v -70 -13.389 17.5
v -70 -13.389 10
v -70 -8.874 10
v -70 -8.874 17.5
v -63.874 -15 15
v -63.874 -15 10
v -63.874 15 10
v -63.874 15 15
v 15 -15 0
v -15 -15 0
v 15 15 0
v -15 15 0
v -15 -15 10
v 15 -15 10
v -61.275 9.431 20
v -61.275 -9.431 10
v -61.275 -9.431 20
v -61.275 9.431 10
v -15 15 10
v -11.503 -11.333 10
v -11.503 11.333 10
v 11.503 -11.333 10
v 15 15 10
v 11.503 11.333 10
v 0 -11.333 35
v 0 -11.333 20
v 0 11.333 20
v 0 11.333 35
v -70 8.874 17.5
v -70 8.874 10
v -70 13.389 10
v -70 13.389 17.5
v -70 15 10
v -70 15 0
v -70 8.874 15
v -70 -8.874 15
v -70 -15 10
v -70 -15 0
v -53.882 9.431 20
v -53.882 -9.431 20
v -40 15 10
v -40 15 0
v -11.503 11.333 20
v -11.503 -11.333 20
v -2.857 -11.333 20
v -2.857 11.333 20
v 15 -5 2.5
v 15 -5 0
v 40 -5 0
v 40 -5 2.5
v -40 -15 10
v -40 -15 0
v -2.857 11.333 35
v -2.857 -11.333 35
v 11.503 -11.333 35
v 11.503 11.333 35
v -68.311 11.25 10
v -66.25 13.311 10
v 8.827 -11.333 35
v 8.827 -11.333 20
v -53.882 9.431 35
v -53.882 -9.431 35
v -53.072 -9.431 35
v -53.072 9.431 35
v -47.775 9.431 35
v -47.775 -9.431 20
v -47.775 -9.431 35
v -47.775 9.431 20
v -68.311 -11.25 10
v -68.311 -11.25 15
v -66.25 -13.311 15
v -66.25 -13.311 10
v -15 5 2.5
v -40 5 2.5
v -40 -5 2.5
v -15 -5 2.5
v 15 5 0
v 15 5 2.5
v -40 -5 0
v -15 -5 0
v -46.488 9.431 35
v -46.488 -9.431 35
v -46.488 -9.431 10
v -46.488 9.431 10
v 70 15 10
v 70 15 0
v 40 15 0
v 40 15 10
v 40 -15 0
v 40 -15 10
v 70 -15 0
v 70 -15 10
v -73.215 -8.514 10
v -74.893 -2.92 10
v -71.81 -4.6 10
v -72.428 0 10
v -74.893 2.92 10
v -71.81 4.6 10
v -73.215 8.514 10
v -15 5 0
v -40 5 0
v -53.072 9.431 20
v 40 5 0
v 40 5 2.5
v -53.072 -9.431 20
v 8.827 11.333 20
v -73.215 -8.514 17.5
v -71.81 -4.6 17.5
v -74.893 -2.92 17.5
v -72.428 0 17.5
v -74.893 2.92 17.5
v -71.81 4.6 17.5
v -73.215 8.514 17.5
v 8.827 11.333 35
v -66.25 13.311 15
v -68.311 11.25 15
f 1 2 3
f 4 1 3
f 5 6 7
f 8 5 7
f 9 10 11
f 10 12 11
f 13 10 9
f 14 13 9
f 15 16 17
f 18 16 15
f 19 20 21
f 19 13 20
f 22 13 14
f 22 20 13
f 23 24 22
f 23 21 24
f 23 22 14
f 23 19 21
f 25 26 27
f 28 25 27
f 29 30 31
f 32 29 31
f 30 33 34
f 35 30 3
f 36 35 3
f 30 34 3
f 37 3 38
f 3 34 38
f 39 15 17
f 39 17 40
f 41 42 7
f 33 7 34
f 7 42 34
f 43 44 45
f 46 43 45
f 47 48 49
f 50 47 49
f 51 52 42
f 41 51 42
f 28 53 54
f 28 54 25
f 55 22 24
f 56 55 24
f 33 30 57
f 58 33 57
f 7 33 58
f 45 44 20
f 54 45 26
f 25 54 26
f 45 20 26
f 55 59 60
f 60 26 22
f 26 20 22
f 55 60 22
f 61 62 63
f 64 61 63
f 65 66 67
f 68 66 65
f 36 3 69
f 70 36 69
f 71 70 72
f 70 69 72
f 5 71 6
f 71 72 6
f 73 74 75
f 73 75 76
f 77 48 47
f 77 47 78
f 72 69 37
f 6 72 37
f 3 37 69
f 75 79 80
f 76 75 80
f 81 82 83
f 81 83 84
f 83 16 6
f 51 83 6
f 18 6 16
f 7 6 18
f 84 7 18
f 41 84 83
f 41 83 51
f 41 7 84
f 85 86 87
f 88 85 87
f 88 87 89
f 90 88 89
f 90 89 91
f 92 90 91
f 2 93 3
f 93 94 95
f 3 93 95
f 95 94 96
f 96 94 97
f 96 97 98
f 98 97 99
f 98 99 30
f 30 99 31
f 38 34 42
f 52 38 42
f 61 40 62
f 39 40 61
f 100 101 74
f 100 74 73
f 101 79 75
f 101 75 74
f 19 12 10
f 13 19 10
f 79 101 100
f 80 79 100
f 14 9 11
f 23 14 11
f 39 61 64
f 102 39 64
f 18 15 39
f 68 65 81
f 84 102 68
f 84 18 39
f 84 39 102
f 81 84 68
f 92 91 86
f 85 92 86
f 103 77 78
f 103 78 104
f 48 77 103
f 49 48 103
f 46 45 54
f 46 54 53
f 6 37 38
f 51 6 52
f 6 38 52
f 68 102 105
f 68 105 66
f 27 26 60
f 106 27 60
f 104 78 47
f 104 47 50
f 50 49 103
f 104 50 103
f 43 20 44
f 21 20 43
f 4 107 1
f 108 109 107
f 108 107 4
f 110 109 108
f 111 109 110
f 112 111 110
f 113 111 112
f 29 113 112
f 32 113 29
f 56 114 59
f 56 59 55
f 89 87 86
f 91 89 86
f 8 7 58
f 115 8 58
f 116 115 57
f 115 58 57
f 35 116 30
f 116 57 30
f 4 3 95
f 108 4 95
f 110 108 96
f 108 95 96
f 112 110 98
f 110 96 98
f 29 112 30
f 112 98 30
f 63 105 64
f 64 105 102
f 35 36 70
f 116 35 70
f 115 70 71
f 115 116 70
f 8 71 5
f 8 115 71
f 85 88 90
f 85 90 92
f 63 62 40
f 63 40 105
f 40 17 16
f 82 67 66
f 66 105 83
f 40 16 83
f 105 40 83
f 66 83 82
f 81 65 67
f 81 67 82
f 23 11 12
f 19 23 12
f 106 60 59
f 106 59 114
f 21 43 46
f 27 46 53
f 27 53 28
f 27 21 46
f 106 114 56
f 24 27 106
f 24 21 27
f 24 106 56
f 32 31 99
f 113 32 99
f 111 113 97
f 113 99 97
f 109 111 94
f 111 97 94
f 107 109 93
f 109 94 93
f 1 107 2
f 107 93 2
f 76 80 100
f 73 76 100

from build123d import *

# Parameters (mm, degrees)
F0_W      = 15
F0_H      = 10
F1_DEPTH  = 10
F0_W_2    = 25
F2_DEPTH  = 2.5
F4_DEPTH  = 5
F5_DEPTH  = 7.5
F6_W      = 0.8094720542
F6_H      = 18.8618451357
F6_W_2    = 1.2870579958
F7_DEPTH  = 25
F6_W_3    = 7.3937214911
F6_W_4    = 5.2971914411
F8_DEPTH  = 10
F9_W      = 2.8573467862
F9_H      = 22.6669162512
F9_W_2    = 2.6768604293
F10_DEPTH = 25
F9_W_3    = 8.6461429019
F9_W_4    = 8.8266292587
F11_DEPTH = 10


with BuildPart() as f1:
    # F0 (on Top) → F1 (new body)
    with BuildSketch(Plane.XY):
        Polygon((-55, 5), (-40, 5), (-40, 15), (-70, 15), (-70, -15), (-40, -15), (-40, -5), (-55, -5), align=None)
        with Locations((-47.5, 0)):
            Rectangle(F0_W, F0_H)
    extrude(amount=F1_DEPTH)

    # F3 (on face) → F4 (join)
    with BuildSketch(Plane.XY.offset(10)):
        with BuildLine():
            Line((-63.8738188665, -15), (-63.8738188665, 15))
            ThreePointArc((-63.8738188665, 15), (-67.3236492419, 12.3236492419), (-70, 8.8738188665))
            Line((-70, 8.8738188665), (-70, -8.8738188665))
            ThreePointArc((-70, -8.8738188665), (-67.3236492419, -12.3236492419), (-63.8738188665, -15))
        make_face()
    extrude(amount=F4_DEPTH)

    # F6 (on face) → F7 (join)
    with BuildSketch(Plane.XY.offset(10)):
        with Locations((-53.4769240767, 0)):
            Rectangle(F6_W, F6_H)
        with Locations((-47.1314676106, 0)):
            Rectangle(F6_W_2, F6_H)
    extrude(amount=F7_DEPTH)

    # F6 (on face) → F8 (join)
    with BuildSketch(Plane.XY.offset(10)):
        with Locations((-57.5785208493, 0)):
            Rectangle(F6_W_3, F6_H)
        with Locations((-50.423592329, 0)):
            Rectangle(F6_W_4, F6_H)
    extrude(amount=F8_DEPTH)


with BuildPart() as f1b:
    # F0 (on Top) → F1, piece 2 (new body)
    with BuildSketch(Plane.XY):
        with Locations((-7.5, -10)):
            Rectangle(F0_W, F0_H)
        with Locations((-7.5, 10)):
            Rectangle(F0_W, F0_H)
        with Locations((7.5, 10)):
            Rectangle(F0_W, F0_H)
        with Locations((7.5, -10)):
            Rectangle(F0_W, F0_H)
        with Locations((-7.5, 0)):
            Rectangle(F0_W, F0_H)
        with Locations((7.5, 0)):
            Rectangle(F0_W, F0_H)
    extrude(amount=F1_DEPTH)

    # F9 (on face) → F10 (join)
    with BuildSketch(Plane.XY.offset(10)):
        with Locations((-1.4286733931, 0)):
            Rectangle(F9_W, F9_H)
        with Locations((10.1650594734, 0)):
            Rectangle(F9_W_2, F9_H)
    extrude(amount=F10_DEPTH)

    # F9 (on face) → F11 (join)
    with BuildSketch(Plane.XY.offset(10)):
        with Locations((-7.1804182371, 0)):
            Rectangle(F9_W_3, F9_H)
        with Locations((4.4133146293, 0)):
            Rectangle(F9_W_4, F9_H)
    extrude(amount=F11_DEPTH)


with BuildPart() as f1c:
    # F0 (on Top) → F1, piece 3 (new body)
    with BuildSketch(Plane.XY):
        Polygon((40, 15), (40, 5), (55, 5), (55, -5), (40, -5), (40, -15), (70, -15), (70, 15), align=None)
        with Locations((47.5, 0)):
            Rectangle(F0_W, F0_H)
    extrude(amount=F1_DEPTH)


with BuildPart() as f2:
    # F0 (on Top) → F2 (new body)
    with BuildSketch(Plane.XY):
        with Locations((-27.5, 0)):
            Rectangle(F0_W_2, F0_H)
    extrude(amount=F2_DEPTH)


with BuildPart() as f2b:
    # F0 (on Top) → F2, piece 2 (new body)
    with BuildSketch(Plane.XY):
        with Locations((27.5, 0)):
            Rectangle(F0_W_2, F0_H)
    extrude(amount=F2_DEPTH)


with BuildPart() as f5:
    # F3 (on face) → F5 (new body)
    with BuildSketch(Plane.XY.offset(10)):
        with BuildLine():
            Line((-70, 8.8738188665), (-70, 13.3890557198))
            ThreePointArc((-70, 13.3890557198), (-75.1063873699, 0), (-70, -13.3890557198))
            Line((-70, -13.3890557198), (-70, -8.8738188665))
            ThreePointArc((-70, -8.8738188665), (-72.4282718959, 0), (-70, 8.8738188665))
        make_face()
    extrude(amount=F5_DEPTH)


solid = Compound([f1.part, f1b.part, f1c.part, f2.part, f2b.part, f5.part])
